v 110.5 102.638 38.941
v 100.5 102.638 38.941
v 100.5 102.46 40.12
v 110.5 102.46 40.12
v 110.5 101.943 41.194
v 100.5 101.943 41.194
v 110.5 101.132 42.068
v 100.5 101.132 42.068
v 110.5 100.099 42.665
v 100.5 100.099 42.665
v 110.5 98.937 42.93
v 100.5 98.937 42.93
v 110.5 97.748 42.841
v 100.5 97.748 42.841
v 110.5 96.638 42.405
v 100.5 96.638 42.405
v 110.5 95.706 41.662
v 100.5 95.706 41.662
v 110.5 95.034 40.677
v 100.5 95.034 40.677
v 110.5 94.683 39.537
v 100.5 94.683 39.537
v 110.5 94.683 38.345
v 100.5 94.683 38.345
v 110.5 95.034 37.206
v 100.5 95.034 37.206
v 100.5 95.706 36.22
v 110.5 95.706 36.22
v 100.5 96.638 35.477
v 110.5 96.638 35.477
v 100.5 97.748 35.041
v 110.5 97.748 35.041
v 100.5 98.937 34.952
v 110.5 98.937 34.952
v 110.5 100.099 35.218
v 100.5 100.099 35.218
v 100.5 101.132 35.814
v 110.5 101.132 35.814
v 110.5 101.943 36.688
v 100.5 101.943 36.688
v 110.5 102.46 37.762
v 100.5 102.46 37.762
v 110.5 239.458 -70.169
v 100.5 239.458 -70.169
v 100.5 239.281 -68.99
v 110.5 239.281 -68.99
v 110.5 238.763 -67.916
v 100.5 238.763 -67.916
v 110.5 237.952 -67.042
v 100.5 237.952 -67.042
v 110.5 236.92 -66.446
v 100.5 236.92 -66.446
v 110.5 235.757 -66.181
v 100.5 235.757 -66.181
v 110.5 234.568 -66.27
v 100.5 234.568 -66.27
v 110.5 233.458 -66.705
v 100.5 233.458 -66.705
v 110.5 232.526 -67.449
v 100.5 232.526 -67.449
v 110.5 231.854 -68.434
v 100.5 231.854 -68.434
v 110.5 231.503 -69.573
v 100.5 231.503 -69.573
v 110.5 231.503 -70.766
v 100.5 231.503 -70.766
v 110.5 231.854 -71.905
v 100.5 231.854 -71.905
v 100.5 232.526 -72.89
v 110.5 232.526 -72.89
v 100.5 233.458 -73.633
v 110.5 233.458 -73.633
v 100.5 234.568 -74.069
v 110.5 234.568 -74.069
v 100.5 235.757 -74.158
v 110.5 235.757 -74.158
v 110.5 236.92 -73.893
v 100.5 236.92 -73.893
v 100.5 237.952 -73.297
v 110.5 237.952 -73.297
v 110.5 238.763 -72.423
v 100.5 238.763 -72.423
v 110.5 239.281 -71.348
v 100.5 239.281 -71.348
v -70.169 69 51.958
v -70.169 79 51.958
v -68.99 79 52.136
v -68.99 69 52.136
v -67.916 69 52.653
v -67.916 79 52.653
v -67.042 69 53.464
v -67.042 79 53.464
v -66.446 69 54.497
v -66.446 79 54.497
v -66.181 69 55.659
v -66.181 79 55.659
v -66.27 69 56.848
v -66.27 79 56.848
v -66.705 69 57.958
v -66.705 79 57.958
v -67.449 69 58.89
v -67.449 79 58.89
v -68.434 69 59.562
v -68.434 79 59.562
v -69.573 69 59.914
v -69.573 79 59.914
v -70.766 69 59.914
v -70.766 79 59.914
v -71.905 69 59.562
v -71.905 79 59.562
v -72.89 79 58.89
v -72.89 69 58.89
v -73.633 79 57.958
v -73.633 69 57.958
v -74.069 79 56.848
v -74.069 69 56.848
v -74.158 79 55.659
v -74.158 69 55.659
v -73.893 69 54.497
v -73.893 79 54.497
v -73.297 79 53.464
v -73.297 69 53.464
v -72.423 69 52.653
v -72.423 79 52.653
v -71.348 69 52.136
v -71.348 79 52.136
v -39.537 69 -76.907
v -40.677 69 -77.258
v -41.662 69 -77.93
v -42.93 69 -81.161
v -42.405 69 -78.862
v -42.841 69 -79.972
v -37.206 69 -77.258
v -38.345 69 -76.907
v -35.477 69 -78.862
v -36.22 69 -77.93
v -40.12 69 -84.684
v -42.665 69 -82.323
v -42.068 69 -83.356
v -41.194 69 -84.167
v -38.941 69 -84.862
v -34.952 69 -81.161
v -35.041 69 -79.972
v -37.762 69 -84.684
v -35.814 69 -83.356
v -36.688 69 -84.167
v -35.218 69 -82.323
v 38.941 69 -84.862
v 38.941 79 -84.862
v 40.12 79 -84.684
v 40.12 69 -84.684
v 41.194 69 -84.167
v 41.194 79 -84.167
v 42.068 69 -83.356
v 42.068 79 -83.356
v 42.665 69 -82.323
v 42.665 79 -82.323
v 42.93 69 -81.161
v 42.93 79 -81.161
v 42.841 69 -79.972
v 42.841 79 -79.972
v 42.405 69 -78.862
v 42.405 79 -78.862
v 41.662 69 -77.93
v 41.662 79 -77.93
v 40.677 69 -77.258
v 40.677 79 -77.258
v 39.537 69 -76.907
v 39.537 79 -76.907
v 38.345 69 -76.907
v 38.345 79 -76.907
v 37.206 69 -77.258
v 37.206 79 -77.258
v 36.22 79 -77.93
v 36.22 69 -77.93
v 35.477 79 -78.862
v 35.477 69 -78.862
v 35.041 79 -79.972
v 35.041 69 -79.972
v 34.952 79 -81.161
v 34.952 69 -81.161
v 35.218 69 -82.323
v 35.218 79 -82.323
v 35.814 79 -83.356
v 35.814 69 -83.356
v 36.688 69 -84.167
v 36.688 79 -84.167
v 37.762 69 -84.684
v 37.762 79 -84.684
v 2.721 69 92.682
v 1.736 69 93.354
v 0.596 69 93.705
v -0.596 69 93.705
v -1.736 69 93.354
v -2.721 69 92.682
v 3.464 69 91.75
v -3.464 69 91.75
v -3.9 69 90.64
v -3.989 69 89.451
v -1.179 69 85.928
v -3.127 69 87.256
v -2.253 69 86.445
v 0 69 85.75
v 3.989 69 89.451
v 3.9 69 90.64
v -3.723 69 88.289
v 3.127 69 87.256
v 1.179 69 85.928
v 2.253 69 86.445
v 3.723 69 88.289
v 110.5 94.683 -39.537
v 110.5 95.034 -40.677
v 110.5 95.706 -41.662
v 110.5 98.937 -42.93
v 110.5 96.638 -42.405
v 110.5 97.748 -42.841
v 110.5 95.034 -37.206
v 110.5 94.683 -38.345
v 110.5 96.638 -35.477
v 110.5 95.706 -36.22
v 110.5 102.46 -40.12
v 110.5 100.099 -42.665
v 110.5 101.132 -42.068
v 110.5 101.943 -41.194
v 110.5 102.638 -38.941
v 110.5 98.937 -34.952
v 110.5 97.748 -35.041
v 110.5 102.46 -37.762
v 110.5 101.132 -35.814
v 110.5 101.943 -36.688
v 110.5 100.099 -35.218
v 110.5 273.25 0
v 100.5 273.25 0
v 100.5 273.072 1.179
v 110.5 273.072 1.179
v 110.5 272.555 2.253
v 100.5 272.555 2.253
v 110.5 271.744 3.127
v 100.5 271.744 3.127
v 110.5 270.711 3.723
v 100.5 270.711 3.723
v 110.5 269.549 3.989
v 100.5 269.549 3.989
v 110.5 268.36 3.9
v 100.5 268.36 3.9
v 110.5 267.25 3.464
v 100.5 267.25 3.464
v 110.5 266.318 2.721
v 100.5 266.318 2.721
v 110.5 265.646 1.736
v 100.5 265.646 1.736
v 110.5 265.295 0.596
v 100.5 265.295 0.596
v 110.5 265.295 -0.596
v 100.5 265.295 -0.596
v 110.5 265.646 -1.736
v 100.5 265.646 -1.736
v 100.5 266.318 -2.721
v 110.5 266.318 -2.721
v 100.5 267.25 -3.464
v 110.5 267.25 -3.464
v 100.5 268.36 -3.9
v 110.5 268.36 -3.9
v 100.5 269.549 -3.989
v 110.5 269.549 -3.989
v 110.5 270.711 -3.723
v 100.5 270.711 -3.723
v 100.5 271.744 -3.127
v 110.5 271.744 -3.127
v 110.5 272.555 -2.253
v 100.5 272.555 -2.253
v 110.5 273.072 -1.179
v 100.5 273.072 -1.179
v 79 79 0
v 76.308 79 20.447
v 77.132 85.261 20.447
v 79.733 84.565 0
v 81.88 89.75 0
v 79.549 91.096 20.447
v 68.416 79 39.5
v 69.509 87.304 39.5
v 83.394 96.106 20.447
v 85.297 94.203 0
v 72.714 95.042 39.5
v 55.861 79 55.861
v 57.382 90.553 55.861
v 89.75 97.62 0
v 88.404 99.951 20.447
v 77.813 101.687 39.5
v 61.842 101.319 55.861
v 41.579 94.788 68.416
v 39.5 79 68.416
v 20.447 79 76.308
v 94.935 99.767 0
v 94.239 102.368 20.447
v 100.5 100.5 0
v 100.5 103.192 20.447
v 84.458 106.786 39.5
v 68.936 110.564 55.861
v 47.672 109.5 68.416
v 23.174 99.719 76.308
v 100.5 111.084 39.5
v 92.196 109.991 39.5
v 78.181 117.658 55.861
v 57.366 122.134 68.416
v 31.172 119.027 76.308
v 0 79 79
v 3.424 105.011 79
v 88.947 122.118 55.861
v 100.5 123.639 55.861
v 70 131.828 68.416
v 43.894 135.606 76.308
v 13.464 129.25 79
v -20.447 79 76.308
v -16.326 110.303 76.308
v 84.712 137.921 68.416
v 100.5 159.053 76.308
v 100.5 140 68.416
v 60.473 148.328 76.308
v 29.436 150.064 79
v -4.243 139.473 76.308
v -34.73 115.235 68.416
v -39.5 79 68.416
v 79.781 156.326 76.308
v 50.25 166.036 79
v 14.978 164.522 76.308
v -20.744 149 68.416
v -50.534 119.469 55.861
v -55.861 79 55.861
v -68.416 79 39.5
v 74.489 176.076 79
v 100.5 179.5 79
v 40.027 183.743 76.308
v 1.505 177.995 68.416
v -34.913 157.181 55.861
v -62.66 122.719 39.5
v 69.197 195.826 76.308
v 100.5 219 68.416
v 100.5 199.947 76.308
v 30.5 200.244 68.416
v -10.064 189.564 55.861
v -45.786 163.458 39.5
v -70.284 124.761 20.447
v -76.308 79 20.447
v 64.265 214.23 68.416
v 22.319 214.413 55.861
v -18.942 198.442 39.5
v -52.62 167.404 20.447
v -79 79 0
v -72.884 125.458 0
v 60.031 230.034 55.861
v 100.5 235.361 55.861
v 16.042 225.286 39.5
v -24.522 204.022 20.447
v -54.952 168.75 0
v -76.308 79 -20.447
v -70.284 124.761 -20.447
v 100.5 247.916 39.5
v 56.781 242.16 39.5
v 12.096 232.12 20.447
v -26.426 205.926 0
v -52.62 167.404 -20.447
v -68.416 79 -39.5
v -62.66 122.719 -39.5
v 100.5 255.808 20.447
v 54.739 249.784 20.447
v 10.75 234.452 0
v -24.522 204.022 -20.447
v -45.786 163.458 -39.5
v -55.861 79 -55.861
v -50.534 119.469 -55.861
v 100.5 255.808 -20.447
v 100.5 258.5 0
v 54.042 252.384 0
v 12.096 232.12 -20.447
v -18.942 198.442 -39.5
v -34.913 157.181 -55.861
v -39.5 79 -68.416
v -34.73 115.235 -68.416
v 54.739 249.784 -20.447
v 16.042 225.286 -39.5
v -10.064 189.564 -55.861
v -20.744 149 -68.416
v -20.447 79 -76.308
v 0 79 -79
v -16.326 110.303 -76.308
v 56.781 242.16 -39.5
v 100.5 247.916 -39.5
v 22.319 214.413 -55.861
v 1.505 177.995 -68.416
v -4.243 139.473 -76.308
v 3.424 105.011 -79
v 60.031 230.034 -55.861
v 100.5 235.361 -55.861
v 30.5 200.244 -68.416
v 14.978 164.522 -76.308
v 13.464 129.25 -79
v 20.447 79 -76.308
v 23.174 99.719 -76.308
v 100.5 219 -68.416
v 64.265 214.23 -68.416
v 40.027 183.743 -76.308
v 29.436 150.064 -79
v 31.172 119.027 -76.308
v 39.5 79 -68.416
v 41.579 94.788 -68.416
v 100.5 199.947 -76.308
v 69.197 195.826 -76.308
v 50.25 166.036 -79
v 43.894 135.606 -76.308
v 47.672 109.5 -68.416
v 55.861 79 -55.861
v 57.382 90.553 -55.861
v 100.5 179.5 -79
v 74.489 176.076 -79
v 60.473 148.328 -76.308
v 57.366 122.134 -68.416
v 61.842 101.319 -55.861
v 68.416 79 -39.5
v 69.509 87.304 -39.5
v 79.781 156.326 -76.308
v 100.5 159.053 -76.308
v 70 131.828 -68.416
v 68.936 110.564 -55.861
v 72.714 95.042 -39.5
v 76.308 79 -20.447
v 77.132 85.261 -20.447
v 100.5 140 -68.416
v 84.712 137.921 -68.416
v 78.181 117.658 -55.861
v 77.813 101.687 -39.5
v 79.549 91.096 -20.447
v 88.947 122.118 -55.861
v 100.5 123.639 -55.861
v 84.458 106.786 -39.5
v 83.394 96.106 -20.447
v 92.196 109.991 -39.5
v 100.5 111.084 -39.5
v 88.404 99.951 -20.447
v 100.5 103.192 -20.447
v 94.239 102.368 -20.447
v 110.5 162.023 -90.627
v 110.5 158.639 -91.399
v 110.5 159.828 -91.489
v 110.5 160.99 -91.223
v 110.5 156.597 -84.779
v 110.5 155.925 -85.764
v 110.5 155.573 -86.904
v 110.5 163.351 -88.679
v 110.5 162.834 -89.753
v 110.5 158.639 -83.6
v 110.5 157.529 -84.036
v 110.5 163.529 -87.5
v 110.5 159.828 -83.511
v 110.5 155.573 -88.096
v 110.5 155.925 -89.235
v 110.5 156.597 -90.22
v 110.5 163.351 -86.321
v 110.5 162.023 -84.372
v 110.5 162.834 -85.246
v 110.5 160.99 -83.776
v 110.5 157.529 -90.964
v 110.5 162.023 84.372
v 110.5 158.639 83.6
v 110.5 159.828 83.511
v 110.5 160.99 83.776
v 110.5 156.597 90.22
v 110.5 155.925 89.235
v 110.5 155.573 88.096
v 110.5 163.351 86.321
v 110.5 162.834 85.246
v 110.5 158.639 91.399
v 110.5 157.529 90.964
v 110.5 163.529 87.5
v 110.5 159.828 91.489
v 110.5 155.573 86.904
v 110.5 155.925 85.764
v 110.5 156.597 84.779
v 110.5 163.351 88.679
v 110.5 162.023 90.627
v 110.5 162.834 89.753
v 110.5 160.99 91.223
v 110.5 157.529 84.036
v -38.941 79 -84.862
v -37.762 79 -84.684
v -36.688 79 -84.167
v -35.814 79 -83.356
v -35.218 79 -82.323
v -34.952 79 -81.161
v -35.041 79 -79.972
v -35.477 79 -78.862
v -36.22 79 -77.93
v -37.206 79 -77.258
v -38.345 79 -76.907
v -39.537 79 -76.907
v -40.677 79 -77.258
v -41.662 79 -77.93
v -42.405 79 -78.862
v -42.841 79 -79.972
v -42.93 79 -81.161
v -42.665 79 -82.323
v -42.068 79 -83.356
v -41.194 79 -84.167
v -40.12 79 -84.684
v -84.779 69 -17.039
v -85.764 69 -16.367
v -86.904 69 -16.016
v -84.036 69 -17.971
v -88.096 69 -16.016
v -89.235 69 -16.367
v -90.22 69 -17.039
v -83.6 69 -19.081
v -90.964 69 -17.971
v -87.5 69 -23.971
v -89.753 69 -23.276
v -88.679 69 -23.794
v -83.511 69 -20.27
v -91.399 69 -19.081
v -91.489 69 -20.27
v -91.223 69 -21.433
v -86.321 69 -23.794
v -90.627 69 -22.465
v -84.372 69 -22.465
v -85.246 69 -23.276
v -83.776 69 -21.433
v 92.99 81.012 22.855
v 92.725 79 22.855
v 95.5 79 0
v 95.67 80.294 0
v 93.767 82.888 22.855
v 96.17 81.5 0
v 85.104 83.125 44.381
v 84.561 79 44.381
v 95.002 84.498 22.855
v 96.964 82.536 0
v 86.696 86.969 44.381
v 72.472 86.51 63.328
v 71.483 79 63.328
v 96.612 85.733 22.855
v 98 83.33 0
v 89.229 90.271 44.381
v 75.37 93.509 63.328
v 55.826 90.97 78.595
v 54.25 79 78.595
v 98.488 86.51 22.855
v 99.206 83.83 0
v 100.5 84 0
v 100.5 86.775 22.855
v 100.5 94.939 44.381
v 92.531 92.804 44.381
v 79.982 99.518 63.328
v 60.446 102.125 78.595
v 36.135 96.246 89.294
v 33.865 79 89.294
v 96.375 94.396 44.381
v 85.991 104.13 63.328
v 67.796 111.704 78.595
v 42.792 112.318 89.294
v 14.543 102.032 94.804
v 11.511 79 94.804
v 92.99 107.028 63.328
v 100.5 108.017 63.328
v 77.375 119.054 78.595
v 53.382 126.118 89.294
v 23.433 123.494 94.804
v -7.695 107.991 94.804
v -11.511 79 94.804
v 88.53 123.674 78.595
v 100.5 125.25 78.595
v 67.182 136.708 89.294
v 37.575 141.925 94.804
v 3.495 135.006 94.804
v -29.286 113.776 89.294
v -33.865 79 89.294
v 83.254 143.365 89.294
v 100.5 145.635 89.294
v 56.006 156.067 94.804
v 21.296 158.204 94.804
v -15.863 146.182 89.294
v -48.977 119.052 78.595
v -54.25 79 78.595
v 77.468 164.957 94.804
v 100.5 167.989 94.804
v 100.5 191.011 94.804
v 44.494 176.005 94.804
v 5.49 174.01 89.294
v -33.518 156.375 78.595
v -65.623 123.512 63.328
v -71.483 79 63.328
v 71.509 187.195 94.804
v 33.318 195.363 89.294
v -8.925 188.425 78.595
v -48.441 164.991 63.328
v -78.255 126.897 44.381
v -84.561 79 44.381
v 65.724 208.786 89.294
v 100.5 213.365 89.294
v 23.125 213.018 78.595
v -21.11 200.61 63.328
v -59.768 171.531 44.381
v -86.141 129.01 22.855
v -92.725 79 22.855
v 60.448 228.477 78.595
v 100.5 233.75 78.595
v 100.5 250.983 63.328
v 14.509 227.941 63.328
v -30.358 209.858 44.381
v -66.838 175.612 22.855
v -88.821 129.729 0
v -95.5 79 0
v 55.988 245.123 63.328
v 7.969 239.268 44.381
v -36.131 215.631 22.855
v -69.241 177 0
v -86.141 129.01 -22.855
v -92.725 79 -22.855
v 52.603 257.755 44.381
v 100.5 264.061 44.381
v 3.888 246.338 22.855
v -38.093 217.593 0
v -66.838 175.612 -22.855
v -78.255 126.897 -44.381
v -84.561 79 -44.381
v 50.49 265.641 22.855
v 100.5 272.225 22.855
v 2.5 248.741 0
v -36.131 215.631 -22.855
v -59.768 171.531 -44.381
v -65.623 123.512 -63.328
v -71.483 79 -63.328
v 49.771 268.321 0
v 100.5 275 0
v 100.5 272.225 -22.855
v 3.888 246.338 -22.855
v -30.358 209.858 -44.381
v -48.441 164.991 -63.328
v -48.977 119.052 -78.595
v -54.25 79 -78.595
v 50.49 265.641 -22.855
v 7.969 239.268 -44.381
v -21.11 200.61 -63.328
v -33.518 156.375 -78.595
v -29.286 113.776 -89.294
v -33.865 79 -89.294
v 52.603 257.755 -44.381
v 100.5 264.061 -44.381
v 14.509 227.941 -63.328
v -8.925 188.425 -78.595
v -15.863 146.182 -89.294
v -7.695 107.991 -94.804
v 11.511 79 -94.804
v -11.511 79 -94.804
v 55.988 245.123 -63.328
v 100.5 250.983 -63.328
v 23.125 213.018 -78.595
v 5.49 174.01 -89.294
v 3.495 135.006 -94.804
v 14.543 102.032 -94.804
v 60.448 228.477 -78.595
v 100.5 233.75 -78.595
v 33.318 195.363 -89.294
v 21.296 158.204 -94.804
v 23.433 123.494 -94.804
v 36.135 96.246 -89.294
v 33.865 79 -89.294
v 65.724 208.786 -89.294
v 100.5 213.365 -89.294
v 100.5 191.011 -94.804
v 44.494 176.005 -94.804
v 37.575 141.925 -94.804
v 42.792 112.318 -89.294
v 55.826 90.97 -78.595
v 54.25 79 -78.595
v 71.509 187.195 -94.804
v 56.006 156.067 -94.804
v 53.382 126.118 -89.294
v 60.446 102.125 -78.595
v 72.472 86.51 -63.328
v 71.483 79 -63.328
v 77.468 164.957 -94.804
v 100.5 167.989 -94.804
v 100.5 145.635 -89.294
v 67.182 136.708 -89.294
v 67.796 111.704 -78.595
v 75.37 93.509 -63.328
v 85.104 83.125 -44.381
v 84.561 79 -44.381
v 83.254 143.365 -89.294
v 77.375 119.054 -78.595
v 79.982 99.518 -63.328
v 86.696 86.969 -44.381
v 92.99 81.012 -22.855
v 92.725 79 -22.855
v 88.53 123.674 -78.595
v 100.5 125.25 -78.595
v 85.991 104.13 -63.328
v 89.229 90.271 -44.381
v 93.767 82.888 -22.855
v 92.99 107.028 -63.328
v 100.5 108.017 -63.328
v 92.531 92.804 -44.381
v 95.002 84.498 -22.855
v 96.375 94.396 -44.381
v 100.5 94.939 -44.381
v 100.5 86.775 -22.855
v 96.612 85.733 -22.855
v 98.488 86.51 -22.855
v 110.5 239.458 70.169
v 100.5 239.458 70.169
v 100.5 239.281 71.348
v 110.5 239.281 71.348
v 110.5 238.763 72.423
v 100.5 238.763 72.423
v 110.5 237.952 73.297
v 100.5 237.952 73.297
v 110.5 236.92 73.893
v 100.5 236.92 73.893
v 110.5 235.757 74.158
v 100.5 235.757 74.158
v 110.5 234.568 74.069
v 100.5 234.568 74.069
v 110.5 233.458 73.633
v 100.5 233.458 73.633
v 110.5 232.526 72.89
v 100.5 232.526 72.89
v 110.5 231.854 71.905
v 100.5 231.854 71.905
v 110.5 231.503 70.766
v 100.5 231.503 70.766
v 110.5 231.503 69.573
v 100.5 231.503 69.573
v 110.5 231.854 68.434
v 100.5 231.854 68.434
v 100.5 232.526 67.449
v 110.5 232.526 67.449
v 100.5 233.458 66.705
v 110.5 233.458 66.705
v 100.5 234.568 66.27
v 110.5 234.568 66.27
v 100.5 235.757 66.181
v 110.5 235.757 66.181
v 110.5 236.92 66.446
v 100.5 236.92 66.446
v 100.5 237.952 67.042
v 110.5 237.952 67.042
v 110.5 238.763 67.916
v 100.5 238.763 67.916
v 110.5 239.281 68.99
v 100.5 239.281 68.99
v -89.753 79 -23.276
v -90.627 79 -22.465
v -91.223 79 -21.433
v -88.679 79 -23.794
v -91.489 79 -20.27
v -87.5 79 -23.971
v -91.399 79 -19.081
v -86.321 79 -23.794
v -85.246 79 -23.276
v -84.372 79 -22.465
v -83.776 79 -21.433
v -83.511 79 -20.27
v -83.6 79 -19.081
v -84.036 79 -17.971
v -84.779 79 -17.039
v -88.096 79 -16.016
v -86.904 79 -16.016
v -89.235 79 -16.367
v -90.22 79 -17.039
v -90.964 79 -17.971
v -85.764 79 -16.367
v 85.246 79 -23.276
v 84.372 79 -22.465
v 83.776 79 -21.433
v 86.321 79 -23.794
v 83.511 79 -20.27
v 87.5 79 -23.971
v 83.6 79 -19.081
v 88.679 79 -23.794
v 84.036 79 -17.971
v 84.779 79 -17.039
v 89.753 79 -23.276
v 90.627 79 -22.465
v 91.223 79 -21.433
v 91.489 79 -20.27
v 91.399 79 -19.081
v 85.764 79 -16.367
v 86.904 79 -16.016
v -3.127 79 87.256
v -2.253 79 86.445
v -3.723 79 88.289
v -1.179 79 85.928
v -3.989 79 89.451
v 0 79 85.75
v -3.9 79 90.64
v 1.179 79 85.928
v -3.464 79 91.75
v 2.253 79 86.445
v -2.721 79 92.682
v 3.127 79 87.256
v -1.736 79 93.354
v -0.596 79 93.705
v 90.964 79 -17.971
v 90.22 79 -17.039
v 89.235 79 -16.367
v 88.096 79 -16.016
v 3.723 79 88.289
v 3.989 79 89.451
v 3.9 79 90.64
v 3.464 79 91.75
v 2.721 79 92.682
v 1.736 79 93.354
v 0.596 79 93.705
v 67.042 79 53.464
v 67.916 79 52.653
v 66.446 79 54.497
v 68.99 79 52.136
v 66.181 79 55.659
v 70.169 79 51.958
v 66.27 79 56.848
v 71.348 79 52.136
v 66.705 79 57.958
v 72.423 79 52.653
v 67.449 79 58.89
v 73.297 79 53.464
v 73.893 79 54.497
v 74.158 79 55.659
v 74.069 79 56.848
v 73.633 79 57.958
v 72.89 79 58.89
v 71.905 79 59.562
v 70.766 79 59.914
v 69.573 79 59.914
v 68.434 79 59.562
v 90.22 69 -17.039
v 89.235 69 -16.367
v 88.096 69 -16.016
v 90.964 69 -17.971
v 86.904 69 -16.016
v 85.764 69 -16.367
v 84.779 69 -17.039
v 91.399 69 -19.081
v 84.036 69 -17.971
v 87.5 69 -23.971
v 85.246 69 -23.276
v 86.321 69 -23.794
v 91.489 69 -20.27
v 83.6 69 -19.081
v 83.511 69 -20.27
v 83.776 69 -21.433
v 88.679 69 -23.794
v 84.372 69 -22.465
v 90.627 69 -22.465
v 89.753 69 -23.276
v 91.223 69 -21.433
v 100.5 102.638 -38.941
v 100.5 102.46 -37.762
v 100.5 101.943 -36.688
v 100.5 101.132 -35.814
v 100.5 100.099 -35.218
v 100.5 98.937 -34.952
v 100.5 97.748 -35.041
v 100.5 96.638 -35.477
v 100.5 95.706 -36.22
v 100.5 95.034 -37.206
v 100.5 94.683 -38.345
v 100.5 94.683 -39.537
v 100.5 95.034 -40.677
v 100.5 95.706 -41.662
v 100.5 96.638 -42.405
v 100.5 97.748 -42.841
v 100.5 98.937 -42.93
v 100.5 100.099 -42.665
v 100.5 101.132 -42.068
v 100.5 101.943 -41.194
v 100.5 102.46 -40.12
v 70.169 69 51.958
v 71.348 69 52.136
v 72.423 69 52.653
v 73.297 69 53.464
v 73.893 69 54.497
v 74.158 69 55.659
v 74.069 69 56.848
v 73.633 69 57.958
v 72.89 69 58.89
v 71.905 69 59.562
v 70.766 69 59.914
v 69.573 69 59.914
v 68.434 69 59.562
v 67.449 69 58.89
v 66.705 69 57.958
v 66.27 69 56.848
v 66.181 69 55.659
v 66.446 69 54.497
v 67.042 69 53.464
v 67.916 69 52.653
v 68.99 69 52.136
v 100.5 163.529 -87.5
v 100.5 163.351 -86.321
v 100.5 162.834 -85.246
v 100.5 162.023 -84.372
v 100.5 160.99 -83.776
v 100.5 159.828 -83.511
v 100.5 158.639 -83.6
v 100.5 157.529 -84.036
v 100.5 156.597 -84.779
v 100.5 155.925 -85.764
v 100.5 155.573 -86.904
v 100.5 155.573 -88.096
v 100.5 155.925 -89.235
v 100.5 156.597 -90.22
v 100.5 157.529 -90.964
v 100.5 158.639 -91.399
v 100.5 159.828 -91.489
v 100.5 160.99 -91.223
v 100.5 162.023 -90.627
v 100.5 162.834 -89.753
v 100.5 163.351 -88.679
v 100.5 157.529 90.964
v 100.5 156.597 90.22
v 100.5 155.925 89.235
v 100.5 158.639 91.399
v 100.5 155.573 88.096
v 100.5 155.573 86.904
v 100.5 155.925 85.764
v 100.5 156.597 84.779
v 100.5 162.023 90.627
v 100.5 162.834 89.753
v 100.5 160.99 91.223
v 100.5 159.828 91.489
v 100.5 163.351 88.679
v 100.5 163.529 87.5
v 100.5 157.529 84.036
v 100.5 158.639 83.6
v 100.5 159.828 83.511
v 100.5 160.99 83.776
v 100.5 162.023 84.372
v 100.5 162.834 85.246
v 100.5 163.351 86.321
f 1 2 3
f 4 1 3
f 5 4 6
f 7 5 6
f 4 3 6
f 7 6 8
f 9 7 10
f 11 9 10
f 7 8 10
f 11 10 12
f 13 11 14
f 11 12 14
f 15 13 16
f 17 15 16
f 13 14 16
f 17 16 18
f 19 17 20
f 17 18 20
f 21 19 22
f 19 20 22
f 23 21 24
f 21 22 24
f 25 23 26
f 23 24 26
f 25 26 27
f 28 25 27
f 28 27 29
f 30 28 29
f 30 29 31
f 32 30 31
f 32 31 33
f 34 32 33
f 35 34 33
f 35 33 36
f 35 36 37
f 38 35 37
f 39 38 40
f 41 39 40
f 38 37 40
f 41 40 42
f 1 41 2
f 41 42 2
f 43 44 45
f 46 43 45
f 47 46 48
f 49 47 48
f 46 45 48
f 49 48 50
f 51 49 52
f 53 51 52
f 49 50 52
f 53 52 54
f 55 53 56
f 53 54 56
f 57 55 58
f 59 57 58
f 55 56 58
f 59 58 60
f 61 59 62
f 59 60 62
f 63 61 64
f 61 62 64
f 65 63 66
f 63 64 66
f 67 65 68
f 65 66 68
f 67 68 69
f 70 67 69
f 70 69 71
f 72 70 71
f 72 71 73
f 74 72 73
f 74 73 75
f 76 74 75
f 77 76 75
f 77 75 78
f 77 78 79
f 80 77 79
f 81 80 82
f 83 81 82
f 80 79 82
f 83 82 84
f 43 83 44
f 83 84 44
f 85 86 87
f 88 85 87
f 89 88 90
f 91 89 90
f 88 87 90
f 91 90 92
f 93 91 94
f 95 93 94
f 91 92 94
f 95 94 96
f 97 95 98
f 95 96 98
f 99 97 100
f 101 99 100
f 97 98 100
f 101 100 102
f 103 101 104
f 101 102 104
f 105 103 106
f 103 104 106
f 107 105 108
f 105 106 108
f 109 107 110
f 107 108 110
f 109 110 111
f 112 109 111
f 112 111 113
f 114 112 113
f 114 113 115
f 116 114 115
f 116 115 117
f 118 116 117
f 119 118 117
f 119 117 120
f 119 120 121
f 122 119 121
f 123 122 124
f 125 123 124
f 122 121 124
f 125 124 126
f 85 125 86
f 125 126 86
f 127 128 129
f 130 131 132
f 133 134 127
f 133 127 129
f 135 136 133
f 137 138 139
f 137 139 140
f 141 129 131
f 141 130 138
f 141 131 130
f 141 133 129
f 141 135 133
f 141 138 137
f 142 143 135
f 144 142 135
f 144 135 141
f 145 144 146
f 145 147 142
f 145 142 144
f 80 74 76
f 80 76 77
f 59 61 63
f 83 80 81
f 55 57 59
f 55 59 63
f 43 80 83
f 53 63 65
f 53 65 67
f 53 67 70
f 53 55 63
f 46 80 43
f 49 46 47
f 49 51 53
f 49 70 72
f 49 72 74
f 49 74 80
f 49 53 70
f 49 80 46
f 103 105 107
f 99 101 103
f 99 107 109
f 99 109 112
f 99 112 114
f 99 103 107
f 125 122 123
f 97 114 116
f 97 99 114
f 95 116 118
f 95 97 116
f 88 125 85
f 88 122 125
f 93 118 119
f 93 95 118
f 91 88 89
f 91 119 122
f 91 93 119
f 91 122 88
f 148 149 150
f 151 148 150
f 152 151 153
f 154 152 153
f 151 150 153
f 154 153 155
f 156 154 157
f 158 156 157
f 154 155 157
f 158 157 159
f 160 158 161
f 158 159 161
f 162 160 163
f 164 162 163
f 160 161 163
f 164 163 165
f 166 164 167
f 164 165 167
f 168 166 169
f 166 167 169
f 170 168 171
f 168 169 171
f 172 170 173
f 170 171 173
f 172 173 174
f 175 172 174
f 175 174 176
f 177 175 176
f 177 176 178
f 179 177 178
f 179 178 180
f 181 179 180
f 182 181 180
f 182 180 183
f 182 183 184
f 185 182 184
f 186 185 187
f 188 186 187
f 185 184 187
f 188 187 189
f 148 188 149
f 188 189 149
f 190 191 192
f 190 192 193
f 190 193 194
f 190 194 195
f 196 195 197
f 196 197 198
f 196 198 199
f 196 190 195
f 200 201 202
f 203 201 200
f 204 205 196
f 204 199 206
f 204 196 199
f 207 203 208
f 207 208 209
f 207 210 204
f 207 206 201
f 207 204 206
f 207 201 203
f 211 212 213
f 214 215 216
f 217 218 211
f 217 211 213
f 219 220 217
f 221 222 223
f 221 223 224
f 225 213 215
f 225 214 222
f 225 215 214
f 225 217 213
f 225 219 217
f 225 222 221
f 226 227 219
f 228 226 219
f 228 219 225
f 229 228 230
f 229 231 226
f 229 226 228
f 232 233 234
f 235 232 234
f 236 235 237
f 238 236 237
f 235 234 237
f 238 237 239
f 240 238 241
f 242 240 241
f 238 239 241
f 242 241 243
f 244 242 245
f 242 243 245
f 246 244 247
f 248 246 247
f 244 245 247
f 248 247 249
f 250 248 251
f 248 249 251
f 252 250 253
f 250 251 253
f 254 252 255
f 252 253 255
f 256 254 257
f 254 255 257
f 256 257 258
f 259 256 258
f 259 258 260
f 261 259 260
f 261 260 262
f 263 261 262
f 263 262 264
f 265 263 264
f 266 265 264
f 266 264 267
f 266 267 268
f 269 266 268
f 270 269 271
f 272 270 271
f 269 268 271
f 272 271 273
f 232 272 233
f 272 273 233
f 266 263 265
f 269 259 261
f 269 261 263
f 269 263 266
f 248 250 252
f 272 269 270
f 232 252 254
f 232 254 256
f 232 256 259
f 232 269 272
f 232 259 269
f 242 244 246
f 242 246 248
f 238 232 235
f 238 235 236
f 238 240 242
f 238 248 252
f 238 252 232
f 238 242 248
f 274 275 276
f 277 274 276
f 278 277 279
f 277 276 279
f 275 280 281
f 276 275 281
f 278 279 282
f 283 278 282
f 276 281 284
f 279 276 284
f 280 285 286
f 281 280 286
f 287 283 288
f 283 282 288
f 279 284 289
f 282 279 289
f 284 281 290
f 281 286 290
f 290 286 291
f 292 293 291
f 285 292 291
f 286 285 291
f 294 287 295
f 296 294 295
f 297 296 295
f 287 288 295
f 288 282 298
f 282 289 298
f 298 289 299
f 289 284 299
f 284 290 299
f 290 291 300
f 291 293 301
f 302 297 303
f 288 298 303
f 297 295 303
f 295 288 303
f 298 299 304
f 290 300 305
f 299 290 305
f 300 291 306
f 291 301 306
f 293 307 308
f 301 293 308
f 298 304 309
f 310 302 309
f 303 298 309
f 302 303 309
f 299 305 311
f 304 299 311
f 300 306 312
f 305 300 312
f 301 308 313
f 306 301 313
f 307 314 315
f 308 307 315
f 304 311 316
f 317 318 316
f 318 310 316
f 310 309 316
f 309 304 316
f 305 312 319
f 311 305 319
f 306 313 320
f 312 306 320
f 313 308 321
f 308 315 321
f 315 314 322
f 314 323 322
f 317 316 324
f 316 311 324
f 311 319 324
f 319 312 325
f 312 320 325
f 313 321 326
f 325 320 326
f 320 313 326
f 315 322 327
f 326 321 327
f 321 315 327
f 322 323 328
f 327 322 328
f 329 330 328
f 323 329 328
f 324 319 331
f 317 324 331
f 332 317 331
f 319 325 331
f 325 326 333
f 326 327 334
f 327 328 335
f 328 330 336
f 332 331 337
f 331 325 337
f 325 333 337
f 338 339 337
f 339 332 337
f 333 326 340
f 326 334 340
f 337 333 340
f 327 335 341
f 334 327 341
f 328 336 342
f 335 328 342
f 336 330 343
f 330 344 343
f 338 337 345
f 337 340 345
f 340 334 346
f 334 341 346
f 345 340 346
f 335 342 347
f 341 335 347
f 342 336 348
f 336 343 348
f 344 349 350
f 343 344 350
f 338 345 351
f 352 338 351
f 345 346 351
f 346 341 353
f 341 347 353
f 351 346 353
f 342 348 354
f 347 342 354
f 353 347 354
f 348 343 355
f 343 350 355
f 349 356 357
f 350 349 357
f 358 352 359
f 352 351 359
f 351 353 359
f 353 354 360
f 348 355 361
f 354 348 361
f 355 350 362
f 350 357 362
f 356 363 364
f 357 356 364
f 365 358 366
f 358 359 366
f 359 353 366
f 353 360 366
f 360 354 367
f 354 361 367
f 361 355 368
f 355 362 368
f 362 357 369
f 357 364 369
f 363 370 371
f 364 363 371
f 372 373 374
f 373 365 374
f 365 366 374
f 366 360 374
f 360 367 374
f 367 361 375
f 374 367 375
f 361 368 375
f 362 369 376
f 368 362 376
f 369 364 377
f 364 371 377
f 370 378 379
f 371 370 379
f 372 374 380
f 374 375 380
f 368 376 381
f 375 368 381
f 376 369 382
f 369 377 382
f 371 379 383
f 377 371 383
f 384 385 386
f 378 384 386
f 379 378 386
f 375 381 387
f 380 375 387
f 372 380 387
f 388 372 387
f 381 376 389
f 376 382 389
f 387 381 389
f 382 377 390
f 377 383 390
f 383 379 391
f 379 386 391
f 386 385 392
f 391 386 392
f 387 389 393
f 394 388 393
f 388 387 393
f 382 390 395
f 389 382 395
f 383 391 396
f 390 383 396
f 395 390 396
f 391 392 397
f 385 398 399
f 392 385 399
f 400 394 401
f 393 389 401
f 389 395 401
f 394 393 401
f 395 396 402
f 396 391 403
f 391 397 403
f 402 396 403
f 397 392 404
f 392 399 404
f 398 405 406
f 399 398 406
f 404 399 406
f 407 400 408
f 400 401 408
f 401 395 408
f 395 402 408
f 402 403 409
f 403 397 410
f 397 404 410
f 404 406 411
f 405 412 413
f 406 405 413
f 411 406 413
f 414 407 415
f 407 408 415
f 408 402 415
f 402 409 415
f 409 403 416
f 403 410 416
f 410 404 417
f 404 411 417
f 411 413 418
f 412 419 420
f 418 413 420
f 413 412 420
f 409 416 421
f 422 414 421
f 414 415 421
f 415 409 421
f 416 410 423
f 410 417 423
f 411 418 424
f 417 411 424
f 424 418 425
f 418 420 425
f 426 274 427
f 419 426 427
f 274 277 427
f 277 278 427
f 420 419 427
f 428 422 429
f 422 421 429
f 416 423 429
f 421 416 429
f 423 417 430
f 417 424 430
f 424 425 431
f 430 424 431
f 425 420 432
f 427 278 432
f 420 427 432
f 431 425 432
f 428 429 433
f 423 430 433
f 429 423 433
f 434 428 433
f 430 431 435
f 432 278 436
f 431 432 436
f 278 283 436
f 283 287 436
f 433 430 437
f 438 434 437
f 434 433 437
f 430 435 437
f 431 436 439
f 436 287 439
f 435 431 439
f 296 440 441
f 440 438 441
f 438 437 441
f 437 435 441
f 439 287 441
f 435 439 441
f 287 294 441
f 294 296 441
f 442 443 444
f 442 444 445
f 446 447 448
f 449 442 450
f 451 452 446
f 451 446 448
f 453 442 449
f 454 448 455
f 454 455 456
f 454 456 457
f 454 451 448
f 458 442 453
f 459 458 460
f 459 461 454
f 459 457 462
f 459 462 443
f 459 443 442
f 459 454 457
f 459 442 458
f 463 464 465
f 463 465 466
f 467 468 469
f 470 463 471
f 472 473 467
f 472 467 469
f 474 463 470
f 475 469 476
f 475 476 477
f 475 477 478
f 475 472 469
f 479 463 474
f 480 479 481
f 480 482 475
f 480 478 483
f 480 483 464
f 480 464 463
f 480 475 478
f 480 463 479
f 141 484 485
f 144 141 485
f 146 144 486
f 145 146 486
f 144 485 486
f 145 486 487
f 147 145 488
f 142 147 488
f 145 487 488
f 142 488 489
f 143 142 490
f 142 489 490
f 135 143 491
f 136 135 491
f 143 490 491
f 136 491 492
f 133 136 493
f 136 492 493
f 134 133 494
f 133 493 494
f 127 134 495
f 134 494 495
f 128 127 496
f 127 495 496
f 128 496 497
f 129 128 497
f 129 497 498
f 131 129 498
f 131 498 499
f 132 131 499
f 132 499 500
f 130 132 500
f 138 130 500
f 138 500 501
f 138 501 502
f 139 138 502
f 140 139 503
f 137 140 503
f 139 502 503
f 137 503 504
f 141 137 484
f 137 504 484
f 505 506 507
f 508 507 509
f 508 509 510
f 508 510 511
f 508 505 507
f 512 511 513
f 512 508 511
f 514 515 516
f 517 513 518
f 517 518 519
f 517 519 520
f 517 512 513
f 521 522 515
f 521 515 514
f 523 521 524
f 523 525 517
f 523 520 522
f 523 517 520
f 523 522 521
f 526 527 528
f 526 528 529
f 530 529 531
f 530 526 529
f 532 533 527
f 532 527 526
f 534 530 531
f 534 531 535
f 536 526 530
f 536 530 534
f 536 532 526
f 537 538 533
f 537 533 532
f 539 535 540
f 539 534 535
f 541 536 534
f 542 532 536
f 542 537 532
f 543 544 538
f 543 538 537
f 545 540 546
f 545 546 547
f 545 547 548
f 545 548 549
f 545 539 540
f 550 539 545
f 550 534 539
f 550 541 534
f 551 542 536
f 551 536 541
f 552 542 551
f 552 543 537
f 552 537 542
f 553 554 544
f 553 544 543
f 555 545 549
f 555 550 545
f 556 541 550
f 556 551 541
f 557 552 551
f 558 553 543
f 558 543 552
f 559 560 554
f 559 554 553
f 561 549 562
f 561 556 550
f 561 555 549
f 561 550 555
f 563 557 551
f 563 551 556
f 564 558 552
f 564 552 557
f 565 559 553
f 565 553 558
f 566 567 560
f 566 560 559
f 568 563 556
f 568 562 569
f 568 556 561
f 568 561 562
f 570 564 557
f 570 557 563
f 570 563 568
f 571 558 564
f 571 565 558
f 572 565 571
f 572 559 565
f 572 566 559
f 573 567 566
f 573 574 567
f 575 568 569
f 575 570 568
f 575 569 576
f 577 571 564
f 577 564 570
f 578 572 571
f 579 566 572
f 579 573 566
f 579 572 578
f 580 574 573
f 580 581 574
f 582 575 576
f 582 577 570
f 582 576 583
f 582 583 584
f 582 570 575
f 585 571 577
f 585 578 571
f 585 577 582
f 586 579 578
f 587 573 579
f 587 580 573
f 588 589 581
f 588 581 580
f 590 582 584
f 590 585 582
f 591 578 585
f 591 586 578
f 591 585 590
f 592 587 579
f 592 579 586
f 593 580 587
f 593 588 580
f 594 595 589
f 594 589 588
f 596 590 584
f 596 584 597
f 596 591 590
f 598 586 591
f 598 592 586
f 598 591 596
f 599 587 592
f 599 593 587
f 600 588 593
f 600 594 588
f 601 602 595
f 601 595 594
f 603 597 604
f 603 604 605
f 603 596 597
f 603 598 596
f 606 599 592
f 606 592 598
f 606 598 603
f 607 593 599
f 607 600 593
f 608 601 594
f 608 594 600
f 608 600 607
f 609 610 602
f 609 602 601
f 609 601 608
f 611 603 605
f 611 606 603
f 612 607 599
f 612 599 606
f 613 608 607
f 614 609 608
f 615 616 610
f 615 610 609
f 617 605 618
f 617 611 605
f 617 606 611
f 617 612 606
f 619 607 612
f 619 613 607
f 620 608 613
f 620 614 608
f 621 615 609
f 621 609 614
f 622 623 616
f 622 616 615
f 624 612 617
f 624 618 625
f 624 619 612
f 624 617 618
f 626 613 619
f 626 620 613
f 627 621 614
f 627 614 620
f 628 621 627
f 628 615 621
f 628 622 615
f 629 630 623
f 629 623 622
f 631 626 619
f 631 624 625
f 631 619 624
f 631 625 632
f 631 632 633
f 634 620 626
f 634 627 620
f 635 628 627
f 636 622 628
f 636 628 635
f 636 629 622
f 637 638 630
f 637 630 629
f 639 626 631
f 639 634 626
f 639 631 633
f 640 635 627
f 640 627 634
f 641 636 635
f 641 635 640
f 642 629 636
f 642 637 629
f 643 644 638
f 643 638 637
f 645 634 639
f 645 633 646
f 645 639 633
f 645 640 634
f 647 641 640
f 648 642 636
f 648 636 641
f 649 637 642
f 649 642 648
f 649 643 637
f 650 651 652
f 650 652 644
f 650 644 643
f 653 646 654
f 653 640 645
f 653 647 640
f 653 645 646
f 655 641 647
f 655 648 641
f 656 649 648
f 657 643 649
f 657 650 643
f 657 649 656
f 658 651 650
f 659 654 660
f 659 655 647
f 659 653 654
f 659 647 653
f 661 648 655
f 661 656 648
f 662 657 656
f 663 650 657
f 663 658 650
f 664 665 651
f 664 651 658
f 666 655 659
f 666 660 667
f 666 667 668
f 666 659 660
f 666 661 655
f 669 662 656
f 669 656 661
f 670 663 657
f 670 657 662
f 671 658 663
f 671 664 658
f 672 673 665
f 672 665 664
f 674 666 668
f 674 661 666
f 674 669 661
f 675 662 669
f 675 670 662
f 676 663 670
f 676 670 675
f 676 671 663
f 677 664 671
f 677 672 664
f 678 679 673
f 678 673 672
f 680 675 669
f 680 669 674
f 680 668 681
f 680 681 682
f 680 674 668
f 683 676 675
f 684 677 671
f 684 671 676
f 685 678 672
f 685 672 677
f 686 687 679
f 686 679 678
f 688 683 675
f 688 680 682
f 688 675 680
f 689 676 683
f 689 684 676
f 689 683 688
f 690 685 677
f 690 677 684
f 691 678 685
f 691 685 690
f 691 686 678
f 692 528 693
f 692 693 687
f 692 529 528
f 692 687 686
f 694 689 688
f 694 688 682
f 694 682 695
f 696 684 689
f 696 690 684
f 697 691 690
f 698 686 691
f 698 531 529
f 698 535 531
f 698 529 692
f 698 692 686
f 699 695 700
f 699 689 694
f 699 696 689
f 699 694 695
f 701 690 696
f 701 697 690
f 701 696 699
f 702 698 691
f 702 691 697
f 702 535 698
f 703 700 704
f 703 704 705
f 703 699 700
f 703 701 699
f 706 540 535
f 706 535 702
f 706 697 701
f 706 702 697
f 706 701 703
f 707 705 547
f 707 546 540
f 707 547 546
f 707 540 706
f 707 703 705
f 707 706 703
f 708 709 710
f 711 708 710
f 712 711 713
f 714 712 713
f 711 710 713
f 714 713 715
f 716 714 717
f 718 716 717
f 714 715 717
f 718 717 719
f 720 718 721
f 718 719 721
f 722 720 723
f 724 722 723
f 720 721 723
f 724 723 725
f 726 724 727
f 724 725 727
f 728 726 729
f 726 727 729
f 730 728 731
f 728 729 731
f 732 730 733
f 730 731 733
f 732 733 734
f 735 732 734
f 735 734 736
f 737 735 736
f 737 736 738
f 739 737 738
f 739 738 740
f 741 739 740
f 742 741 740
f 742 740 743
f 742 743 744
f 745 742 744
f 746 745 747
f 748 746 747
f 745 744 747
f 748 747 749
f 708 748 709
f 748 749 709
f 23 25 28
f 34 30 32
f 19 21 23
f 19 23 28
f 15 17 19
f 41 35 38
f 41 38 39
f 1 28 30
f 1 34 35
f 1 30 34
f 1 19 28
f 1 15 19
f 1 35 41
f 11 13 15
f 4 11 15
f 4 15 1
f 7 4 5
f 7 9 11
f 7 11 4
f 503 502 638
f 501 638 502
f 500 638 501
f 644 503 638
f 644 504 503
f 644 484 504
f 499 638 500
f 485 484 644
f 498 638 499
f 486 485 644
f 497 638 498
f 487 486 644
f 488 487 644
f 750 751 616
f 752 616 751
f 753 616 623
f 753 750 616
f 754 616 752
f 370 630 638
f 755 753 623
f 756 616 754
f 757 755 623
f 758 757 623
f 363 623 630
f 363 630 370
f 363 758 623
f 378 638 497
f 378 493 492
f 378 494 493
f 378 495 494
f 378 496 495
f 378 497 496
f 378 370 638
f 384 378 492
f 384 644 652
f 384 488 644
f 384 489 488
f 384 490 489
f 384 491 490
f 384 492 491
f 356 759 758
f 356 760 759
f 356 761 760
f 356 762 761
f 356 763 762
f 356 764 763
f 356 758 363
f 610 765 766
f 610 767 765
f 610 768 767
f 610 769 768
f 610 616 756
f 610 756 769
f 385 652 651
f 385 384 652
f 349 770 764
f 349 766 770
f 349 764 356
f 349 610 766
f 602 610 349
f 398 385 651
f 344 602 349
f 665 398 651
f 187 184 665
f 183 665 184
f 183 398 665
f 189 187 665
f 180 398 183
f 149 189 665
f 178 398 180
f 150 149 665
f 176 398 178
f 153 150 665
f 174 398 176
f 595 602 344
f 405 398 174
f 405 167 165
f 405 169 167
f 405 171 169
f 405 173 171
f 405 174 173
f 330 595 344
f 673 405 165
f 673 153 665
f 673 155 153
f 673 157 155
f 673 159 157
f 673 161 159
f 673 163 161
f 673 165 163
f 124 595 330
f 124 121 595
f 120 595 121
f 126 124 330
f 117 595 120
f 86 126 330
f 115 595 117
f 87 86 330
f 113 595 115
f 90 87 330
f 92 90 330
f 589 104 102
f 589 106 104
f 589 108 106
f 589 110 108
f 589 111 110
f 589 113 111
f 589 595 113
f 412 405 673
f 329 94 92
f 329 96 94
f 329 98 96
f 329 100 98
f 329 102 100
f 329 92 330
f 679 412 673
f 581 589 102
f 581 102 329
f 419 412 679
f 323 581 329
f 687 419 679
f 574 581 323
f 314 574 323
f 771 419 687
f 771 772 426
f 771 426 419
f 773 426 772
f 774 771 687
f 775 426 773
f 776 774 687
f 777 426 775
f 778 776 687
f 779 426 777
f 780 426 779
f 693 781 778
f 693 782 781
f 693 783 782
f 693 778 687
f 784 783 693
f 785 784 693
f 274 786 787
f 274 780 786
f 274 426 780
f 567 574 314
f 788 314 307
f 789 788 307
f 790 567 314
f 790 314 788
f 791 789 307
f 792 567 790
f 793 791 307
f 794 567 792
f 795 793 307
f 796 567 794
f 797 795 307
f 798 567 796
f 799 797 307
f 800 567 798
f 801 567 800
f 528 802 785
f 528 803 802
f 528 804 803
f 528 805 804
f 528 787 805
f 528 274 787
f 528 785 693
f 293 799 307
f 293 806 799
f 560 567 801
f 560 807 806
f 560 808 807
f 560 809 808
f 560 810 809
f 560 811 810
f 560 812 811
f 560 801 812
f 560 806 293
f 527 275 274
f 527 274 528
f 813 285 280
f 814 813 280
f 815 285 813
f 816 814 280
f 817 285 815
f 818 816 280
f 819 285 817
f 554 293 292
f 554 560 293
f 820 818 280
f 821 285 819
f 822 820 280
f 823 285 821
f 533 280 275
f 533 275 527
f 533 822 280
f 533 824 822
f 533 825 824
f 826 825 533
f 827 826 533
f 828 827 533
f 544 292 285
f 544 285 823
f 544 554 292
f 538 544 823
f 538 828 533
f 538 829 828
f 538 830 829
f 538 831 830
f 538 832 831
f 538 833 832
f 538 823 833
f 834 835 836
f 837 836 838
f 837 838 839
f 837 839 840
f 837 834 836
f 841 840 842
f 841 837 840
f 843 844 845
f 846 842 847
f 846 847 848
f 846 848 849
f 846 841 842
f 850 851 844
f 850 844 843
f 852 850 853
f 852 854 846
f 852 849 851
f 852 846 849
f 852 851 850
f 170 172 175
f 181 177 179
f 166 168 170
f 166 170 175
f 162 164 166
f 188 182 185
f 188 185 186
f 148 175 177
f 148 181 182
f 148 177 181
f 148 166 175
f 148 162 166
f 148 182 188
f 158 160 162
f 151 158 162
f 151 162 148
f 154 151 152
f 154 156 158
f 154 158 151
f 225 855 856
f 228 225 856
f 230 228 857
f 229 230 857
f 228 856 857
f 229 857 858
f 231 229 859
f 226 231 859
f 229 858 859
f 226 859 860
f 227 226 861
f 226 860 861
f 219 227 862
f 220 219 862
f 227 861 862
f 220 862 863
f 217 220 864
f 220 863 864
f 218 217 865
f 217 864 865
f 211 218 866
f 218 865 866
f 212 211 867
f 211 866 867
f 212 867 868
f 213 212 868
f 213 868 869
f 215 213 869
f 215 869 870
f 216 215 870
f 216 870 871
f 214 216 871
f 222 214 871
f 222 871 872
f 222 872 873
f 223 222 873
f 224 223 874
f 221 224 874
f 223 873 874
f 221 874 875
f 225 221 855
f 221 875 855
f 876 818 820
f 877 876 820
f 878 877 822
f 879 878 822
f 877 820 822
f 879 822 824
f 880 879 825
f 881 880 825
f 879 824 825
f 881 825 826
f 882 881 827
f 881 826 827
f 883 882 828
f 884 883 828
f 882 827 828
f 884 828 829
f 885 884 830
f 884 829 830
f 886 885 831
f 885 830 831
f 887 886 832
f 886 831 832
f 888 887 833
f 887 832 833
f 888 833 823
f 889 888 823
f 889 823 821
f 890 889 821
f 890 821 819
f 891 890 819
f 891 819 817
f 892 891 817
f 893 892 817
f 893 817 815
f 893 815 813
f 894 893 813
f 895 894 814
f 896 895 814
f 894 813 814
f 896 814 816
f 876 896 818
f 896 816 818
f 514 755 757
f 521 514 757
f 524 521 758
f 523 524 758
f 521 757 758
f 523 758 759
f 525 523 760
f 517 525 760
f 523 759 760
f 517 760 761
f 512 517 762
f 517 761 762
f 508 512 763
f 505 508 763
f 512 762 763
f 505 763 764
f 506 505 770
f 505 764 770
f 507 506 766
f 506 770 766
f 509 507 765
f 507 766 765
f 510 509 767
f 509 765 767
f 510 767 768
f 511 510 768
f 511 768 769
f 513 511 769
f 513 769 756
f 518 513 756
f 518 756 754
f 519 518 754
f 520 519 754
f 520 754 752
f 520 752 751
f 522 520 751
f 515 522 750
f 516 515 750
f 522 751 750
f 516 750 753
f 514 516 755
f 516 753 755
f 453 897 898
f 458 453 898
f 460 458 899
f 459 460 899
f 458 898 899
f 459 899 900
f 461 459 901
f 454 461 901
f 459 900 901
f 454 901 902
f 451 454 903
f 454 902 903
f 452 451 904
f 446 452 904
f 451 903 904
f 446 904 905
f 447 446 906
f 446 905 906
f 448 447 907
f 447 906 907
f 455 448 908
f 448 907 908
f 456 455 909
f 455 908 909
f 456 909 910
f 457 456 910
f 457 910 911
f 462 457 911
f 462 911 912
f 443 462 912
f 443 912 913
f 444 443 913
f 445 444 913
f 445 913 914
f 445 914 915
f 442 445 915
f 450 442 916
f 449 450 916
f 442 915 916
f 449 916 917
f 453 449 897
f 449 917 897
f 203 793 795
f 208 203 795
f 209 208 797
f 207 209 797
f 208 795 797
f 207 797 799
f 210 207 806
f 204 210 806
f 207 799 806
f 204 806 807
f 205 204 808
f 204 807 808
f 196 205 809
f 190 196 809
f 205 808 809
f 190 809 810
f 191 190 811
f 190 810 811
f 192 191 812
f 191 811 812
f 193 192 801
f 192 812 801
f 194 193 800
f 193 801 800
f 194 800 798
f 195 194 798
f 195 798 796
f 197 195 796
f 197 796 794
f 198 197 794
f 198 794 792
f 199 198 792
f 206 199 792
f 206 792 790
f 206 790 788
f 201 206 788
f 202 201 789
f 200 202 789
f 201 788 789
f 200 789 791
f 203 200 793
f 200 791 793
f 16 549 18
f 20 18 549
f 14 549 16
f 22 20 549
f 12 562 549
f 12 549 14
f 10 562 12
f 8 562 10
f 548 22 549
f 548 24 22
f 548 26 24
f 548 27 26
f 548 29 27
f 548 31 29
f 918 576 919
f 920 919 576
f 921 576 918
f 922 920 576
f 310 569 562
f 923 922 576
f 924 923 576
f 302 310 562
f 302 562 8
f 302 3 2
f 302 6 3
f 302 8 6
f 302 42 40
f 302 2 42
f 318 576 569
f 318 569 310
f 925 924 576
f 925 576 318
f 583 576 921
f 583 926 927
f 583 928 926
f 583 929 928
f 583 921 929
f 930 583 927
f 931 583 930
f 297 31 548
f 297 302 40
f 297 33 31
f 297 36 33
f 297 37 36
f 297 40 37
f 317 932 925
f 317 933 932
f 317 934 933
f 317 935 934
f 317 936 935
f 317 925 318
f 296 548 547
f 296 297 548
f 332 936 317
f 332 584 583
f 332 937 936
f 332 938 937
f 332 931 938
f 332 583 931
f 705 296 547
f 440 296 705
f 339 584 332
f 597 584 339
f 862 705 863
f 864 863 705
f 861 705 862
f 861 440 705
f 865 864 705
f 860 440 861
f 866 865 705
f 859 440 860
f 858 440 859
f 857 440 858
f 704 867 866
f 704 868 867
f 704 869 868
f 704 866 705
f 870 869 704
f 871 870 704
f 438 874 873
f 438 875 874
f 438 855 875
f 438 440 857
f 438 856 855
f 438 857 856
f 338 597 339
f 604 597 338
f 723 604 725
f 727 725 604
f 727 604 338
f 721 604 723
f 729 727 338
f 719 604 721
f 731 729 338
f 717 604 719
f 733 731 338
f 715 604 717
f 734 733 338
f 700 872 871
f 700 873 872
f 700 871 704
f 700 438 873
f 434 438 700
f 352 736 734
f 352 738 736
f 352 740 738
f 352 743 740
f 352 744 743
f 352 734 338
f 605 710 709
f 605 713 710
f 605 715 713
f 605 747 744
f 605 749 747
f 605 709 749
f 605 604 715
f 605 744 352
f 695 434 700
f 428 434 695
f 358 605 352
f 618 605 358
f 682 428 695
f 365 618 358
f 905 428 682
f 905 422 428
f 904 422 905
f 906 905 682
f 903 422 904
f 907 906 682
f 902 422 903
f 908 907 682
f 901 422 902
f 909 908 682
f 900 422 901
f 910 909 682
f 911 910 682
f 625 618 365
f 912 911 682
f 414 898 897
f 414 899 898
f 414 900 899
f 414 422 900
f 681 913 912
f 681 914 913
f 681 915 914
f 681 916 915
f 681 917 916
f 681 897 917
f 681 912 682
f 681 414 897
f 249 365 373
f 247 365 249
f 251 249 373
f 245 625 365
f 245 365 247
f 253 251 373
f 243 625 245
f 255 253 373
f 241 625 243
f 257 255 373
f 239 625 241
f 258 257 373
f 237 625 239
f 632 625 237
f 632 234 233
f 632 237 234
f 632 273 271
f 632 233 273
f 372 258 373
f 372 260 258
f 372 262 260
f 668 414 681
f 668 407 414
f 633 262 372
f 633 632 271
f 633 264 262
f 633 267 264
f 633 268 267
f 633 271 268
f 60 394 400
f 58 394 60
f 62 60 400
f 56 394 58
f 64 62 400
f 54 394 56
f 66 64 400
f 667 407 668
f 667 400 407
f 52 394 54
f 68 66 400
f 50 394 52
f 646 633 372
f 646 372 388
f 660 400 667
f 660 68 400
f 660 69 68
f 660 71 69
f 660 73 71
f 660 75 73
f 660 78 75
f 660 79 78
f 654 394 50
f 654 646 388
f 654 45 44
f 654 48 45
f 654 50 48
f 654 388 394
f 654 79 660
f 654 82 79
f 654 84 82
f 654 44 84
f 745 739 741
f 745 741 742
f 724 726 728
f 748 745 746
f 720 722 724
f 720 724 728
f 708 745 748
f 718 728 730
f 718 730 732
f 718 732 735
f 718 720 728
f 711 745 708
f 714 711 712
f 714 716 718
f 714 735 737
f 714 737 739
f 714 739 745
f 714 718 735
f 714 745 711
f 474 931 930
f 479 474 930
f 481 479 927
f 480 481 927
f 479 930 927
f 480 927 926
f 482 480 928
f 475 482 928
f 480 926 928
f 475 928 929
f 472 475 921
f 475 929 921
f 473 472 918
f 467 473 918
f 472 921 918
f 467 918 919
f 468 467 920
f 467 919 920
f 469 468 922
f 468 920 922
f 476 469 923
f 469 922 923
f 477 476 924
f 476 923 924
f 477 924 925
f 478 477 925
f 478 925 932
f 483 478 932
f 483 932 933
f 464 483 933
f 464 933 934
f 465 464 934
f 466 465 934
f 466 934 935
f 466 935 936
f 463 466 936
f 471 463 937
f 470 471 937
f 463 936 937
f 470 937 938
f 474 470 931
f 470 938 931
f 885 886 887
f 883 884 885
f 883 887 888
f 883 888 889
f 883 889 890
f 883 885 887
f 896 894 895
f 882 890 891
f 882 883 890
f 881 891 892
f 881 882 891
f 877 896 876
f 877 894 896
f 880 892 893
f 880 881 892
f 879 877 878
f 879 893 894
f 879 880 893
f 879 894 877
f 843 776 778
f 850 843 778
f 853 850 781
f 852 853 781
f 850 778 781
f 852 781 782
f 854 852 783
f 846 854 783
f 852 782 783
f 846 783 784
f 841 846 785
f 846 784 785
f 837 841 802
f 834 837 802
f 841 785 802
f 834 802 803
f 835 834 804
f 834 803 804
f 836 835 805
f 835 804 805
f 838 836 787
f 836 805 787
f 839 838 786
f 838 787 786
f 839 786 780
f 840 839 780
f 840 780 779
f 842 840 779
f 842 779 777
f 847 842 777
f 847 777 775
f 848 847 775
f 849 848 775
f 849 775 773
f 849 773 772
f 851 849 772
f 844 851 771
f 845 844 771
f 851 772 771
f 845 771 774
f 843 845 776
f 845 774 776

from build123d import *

# Parameters (mm, degrees)
CROQUIS4_R              = 95.5
CROQUIS4_R_2            = 79
CORTAR_EXTRUIR1_START   = -79
CROQUIS6_R              = 85
CROQUIS6_R_2            = 79
CORTAR_EXTRUIR1_DEPTH   = 79
CROQUIS7_R              = 85
CROQUIS7_R_2            = 79
CORTAR_EXTRUIR2_DEPTH   = 79
CROQUIS8_R              = 95.5
CORTAR_EXTRUIR3_DEPTH   = 79
CROQUIS10_R             = 4
SALIENTE_EXTRUIR3_DEPTH = 10
CROQUIS11_R             = 95.5
CORTAR_EXTRUIR4_DEPTH   = 351.943371662
CROQUIS12_R             = 4
SALIENTE_EXTRUIR4_DEPTH = 10


with BuildPart() as part:
    # Barrer5: sweep along a path in Croquis3
    with BuildLine(Plane.XY) as barrer5_path:
        Line((0, 0), (0, 79))
        ThreePointArc((0, 79), (29.435768491, 150.064231509), (100.5, 179.5))
        Line((100.5, 179.5), (179.5, 179.5))
    # Croquis4 → Barrer5 (sweep)
    with BuildSketch(Plane(origin=(0, 0, 0), x_dir=(1, 0, 0), z_dir=(0, 1, 0))):
        Circle(CROQUIS4_R)
        Circle(CROQUIS4_R_2, mode=Mode.SUBTRACT)
    sweep(path=barrer5_path.line)

    # Croquis6 → Cortar-Extruir1 (cut)
    with BuildSketch(Plane.XZ.offset(CORTAR_EXTRUIR1_START)):
        with Locations(Location((0, 0, 0), (0, 0, 270))):
            Circle(CROQUIS6_R)
        Circle(CROQUIS6_R_2, mode=Mode.SUBTRACT)
    extrude(amount=CORTAR_EXTRUIR1_DEPTH, mode=Mode.SUBTRACT)

    # Croquis7 → Cortar-Extruir2 (cut)
    with BuildSketch(Plane(origin=(179.5, 0, 0), x_dir=(0, 0, -1), z_dir=(1, 0, 0))):
        with Locations(Location((0, 179.5, 0), (0, 0, 90))):
            Circle(CROQUIS7_R)
        with Locations((0, 179.5)):
            Circle(CROQUIS7_R_2, mode=Mode.SUBTRACT)
    extrude(amount=-CORTAR_EXTRUIR2_DEPTH, mode=Mode.SUBTRACT)

    # Croquis8 → Cortar-Extruir3 (cut)
    with BuildSketch(Plane.XZ.offset(-79)):
        Circle(CROQUIS8_R)
    extrude(amount=CORTAR_EXTRUIR3_DEPTH, mode=Mode.SUBTRACT)

    # Croquis10 → Saliente-Extruir3 (add)
    with BuildSketch(Plane.XZ.offset(-79)):
        with Locations(Location((0, 89.75, 0), (0, 0, 270))):
            Circle(CROQUIS10_R)
        with Locations(Location((70.169375552, 55.958209717, 0), (0, 0, 270))):
            Circle(CROQUIS10_R)
        with Locations(Location((87.499780118, -19.971253823, 0), (0, 0, 270))):
            Circle(CROQUIS10_R)
        with Locations(Location((38.941065586, -80.861955894, 0), (0, 0, 270))):
            Circle(CROQUIS10_R)
        with Locations(Location((-38.941065586, -80.861955894, 0), (0, 0, 270))):
            Circle(CROQUIS10_R)
        with Locations(Location((-87.499780118, -19.971253823, 0), (0, 0, 270))):
            Circle(CROQUIS10_R)
        with Locations(Location((-70.169375552, 55.958209717, 0), (0, 0, 270))):
            Circle(CROQUIS10_R)
    extrude(amount=SALIENTE_EXTRUIR3_DEPTH)

    # Croquis11 → Cortar-Extruir4 (cut, through all)
    with BuildSketch(Plane(origin=(100.5, 0, 0), x_dir=(0, 0, -1), z_dir=(1, 0, 0))):
        with Locations((0, 179.5)):
            Circle(CROQUIS11_R)
    extrude(amount=CORTAR_EXTRUIR4_DEPTH, mode=Mode.SUBTRACT)

    # Croquis12 → Saliente-Extruir4 (add)
    with BuildSketch(Plane(origin=(100.5, 0, 0), x_dir=(0, 0, -1), z_dir=(1, 0, 0))):
        with Locations(Location((0, 269.25, 0), (0, 0, 90))):
            Circle(CROQUIS12_R)
        with Locations(Location((70.169375552, 235.458209717, 0), (0, 0, 90))):
            Circle(CROQUIS12_R)
        with Locations(Location((87.499780118, 159.528746177, 0), (0, 0, 90))):
            Circle(CROQUIS12_R)
        with Locations(Location((38.941065586, 98.638044106, 0), (0, 0, 90))):
            Circle(CROQUIS12_R)
        with Locations(Location((-38.941065586, 98.638044106, 0), (0, 0, 90))):
            Circle(CROQUIS12_R)
        with Locations(Location((-87.499780118, 159.528746177, 0), (0, 0, 90))):
            Circle(CROQUIS12_R)
        with Locations(Location((-70.169375552, 235.458209717, 0), (0, 0, 90))):
            Circle(CROQUIS12_R)
    extrude(amount=SALIENTE_EXTRUIR4_DEPTH)


solid = part.part
